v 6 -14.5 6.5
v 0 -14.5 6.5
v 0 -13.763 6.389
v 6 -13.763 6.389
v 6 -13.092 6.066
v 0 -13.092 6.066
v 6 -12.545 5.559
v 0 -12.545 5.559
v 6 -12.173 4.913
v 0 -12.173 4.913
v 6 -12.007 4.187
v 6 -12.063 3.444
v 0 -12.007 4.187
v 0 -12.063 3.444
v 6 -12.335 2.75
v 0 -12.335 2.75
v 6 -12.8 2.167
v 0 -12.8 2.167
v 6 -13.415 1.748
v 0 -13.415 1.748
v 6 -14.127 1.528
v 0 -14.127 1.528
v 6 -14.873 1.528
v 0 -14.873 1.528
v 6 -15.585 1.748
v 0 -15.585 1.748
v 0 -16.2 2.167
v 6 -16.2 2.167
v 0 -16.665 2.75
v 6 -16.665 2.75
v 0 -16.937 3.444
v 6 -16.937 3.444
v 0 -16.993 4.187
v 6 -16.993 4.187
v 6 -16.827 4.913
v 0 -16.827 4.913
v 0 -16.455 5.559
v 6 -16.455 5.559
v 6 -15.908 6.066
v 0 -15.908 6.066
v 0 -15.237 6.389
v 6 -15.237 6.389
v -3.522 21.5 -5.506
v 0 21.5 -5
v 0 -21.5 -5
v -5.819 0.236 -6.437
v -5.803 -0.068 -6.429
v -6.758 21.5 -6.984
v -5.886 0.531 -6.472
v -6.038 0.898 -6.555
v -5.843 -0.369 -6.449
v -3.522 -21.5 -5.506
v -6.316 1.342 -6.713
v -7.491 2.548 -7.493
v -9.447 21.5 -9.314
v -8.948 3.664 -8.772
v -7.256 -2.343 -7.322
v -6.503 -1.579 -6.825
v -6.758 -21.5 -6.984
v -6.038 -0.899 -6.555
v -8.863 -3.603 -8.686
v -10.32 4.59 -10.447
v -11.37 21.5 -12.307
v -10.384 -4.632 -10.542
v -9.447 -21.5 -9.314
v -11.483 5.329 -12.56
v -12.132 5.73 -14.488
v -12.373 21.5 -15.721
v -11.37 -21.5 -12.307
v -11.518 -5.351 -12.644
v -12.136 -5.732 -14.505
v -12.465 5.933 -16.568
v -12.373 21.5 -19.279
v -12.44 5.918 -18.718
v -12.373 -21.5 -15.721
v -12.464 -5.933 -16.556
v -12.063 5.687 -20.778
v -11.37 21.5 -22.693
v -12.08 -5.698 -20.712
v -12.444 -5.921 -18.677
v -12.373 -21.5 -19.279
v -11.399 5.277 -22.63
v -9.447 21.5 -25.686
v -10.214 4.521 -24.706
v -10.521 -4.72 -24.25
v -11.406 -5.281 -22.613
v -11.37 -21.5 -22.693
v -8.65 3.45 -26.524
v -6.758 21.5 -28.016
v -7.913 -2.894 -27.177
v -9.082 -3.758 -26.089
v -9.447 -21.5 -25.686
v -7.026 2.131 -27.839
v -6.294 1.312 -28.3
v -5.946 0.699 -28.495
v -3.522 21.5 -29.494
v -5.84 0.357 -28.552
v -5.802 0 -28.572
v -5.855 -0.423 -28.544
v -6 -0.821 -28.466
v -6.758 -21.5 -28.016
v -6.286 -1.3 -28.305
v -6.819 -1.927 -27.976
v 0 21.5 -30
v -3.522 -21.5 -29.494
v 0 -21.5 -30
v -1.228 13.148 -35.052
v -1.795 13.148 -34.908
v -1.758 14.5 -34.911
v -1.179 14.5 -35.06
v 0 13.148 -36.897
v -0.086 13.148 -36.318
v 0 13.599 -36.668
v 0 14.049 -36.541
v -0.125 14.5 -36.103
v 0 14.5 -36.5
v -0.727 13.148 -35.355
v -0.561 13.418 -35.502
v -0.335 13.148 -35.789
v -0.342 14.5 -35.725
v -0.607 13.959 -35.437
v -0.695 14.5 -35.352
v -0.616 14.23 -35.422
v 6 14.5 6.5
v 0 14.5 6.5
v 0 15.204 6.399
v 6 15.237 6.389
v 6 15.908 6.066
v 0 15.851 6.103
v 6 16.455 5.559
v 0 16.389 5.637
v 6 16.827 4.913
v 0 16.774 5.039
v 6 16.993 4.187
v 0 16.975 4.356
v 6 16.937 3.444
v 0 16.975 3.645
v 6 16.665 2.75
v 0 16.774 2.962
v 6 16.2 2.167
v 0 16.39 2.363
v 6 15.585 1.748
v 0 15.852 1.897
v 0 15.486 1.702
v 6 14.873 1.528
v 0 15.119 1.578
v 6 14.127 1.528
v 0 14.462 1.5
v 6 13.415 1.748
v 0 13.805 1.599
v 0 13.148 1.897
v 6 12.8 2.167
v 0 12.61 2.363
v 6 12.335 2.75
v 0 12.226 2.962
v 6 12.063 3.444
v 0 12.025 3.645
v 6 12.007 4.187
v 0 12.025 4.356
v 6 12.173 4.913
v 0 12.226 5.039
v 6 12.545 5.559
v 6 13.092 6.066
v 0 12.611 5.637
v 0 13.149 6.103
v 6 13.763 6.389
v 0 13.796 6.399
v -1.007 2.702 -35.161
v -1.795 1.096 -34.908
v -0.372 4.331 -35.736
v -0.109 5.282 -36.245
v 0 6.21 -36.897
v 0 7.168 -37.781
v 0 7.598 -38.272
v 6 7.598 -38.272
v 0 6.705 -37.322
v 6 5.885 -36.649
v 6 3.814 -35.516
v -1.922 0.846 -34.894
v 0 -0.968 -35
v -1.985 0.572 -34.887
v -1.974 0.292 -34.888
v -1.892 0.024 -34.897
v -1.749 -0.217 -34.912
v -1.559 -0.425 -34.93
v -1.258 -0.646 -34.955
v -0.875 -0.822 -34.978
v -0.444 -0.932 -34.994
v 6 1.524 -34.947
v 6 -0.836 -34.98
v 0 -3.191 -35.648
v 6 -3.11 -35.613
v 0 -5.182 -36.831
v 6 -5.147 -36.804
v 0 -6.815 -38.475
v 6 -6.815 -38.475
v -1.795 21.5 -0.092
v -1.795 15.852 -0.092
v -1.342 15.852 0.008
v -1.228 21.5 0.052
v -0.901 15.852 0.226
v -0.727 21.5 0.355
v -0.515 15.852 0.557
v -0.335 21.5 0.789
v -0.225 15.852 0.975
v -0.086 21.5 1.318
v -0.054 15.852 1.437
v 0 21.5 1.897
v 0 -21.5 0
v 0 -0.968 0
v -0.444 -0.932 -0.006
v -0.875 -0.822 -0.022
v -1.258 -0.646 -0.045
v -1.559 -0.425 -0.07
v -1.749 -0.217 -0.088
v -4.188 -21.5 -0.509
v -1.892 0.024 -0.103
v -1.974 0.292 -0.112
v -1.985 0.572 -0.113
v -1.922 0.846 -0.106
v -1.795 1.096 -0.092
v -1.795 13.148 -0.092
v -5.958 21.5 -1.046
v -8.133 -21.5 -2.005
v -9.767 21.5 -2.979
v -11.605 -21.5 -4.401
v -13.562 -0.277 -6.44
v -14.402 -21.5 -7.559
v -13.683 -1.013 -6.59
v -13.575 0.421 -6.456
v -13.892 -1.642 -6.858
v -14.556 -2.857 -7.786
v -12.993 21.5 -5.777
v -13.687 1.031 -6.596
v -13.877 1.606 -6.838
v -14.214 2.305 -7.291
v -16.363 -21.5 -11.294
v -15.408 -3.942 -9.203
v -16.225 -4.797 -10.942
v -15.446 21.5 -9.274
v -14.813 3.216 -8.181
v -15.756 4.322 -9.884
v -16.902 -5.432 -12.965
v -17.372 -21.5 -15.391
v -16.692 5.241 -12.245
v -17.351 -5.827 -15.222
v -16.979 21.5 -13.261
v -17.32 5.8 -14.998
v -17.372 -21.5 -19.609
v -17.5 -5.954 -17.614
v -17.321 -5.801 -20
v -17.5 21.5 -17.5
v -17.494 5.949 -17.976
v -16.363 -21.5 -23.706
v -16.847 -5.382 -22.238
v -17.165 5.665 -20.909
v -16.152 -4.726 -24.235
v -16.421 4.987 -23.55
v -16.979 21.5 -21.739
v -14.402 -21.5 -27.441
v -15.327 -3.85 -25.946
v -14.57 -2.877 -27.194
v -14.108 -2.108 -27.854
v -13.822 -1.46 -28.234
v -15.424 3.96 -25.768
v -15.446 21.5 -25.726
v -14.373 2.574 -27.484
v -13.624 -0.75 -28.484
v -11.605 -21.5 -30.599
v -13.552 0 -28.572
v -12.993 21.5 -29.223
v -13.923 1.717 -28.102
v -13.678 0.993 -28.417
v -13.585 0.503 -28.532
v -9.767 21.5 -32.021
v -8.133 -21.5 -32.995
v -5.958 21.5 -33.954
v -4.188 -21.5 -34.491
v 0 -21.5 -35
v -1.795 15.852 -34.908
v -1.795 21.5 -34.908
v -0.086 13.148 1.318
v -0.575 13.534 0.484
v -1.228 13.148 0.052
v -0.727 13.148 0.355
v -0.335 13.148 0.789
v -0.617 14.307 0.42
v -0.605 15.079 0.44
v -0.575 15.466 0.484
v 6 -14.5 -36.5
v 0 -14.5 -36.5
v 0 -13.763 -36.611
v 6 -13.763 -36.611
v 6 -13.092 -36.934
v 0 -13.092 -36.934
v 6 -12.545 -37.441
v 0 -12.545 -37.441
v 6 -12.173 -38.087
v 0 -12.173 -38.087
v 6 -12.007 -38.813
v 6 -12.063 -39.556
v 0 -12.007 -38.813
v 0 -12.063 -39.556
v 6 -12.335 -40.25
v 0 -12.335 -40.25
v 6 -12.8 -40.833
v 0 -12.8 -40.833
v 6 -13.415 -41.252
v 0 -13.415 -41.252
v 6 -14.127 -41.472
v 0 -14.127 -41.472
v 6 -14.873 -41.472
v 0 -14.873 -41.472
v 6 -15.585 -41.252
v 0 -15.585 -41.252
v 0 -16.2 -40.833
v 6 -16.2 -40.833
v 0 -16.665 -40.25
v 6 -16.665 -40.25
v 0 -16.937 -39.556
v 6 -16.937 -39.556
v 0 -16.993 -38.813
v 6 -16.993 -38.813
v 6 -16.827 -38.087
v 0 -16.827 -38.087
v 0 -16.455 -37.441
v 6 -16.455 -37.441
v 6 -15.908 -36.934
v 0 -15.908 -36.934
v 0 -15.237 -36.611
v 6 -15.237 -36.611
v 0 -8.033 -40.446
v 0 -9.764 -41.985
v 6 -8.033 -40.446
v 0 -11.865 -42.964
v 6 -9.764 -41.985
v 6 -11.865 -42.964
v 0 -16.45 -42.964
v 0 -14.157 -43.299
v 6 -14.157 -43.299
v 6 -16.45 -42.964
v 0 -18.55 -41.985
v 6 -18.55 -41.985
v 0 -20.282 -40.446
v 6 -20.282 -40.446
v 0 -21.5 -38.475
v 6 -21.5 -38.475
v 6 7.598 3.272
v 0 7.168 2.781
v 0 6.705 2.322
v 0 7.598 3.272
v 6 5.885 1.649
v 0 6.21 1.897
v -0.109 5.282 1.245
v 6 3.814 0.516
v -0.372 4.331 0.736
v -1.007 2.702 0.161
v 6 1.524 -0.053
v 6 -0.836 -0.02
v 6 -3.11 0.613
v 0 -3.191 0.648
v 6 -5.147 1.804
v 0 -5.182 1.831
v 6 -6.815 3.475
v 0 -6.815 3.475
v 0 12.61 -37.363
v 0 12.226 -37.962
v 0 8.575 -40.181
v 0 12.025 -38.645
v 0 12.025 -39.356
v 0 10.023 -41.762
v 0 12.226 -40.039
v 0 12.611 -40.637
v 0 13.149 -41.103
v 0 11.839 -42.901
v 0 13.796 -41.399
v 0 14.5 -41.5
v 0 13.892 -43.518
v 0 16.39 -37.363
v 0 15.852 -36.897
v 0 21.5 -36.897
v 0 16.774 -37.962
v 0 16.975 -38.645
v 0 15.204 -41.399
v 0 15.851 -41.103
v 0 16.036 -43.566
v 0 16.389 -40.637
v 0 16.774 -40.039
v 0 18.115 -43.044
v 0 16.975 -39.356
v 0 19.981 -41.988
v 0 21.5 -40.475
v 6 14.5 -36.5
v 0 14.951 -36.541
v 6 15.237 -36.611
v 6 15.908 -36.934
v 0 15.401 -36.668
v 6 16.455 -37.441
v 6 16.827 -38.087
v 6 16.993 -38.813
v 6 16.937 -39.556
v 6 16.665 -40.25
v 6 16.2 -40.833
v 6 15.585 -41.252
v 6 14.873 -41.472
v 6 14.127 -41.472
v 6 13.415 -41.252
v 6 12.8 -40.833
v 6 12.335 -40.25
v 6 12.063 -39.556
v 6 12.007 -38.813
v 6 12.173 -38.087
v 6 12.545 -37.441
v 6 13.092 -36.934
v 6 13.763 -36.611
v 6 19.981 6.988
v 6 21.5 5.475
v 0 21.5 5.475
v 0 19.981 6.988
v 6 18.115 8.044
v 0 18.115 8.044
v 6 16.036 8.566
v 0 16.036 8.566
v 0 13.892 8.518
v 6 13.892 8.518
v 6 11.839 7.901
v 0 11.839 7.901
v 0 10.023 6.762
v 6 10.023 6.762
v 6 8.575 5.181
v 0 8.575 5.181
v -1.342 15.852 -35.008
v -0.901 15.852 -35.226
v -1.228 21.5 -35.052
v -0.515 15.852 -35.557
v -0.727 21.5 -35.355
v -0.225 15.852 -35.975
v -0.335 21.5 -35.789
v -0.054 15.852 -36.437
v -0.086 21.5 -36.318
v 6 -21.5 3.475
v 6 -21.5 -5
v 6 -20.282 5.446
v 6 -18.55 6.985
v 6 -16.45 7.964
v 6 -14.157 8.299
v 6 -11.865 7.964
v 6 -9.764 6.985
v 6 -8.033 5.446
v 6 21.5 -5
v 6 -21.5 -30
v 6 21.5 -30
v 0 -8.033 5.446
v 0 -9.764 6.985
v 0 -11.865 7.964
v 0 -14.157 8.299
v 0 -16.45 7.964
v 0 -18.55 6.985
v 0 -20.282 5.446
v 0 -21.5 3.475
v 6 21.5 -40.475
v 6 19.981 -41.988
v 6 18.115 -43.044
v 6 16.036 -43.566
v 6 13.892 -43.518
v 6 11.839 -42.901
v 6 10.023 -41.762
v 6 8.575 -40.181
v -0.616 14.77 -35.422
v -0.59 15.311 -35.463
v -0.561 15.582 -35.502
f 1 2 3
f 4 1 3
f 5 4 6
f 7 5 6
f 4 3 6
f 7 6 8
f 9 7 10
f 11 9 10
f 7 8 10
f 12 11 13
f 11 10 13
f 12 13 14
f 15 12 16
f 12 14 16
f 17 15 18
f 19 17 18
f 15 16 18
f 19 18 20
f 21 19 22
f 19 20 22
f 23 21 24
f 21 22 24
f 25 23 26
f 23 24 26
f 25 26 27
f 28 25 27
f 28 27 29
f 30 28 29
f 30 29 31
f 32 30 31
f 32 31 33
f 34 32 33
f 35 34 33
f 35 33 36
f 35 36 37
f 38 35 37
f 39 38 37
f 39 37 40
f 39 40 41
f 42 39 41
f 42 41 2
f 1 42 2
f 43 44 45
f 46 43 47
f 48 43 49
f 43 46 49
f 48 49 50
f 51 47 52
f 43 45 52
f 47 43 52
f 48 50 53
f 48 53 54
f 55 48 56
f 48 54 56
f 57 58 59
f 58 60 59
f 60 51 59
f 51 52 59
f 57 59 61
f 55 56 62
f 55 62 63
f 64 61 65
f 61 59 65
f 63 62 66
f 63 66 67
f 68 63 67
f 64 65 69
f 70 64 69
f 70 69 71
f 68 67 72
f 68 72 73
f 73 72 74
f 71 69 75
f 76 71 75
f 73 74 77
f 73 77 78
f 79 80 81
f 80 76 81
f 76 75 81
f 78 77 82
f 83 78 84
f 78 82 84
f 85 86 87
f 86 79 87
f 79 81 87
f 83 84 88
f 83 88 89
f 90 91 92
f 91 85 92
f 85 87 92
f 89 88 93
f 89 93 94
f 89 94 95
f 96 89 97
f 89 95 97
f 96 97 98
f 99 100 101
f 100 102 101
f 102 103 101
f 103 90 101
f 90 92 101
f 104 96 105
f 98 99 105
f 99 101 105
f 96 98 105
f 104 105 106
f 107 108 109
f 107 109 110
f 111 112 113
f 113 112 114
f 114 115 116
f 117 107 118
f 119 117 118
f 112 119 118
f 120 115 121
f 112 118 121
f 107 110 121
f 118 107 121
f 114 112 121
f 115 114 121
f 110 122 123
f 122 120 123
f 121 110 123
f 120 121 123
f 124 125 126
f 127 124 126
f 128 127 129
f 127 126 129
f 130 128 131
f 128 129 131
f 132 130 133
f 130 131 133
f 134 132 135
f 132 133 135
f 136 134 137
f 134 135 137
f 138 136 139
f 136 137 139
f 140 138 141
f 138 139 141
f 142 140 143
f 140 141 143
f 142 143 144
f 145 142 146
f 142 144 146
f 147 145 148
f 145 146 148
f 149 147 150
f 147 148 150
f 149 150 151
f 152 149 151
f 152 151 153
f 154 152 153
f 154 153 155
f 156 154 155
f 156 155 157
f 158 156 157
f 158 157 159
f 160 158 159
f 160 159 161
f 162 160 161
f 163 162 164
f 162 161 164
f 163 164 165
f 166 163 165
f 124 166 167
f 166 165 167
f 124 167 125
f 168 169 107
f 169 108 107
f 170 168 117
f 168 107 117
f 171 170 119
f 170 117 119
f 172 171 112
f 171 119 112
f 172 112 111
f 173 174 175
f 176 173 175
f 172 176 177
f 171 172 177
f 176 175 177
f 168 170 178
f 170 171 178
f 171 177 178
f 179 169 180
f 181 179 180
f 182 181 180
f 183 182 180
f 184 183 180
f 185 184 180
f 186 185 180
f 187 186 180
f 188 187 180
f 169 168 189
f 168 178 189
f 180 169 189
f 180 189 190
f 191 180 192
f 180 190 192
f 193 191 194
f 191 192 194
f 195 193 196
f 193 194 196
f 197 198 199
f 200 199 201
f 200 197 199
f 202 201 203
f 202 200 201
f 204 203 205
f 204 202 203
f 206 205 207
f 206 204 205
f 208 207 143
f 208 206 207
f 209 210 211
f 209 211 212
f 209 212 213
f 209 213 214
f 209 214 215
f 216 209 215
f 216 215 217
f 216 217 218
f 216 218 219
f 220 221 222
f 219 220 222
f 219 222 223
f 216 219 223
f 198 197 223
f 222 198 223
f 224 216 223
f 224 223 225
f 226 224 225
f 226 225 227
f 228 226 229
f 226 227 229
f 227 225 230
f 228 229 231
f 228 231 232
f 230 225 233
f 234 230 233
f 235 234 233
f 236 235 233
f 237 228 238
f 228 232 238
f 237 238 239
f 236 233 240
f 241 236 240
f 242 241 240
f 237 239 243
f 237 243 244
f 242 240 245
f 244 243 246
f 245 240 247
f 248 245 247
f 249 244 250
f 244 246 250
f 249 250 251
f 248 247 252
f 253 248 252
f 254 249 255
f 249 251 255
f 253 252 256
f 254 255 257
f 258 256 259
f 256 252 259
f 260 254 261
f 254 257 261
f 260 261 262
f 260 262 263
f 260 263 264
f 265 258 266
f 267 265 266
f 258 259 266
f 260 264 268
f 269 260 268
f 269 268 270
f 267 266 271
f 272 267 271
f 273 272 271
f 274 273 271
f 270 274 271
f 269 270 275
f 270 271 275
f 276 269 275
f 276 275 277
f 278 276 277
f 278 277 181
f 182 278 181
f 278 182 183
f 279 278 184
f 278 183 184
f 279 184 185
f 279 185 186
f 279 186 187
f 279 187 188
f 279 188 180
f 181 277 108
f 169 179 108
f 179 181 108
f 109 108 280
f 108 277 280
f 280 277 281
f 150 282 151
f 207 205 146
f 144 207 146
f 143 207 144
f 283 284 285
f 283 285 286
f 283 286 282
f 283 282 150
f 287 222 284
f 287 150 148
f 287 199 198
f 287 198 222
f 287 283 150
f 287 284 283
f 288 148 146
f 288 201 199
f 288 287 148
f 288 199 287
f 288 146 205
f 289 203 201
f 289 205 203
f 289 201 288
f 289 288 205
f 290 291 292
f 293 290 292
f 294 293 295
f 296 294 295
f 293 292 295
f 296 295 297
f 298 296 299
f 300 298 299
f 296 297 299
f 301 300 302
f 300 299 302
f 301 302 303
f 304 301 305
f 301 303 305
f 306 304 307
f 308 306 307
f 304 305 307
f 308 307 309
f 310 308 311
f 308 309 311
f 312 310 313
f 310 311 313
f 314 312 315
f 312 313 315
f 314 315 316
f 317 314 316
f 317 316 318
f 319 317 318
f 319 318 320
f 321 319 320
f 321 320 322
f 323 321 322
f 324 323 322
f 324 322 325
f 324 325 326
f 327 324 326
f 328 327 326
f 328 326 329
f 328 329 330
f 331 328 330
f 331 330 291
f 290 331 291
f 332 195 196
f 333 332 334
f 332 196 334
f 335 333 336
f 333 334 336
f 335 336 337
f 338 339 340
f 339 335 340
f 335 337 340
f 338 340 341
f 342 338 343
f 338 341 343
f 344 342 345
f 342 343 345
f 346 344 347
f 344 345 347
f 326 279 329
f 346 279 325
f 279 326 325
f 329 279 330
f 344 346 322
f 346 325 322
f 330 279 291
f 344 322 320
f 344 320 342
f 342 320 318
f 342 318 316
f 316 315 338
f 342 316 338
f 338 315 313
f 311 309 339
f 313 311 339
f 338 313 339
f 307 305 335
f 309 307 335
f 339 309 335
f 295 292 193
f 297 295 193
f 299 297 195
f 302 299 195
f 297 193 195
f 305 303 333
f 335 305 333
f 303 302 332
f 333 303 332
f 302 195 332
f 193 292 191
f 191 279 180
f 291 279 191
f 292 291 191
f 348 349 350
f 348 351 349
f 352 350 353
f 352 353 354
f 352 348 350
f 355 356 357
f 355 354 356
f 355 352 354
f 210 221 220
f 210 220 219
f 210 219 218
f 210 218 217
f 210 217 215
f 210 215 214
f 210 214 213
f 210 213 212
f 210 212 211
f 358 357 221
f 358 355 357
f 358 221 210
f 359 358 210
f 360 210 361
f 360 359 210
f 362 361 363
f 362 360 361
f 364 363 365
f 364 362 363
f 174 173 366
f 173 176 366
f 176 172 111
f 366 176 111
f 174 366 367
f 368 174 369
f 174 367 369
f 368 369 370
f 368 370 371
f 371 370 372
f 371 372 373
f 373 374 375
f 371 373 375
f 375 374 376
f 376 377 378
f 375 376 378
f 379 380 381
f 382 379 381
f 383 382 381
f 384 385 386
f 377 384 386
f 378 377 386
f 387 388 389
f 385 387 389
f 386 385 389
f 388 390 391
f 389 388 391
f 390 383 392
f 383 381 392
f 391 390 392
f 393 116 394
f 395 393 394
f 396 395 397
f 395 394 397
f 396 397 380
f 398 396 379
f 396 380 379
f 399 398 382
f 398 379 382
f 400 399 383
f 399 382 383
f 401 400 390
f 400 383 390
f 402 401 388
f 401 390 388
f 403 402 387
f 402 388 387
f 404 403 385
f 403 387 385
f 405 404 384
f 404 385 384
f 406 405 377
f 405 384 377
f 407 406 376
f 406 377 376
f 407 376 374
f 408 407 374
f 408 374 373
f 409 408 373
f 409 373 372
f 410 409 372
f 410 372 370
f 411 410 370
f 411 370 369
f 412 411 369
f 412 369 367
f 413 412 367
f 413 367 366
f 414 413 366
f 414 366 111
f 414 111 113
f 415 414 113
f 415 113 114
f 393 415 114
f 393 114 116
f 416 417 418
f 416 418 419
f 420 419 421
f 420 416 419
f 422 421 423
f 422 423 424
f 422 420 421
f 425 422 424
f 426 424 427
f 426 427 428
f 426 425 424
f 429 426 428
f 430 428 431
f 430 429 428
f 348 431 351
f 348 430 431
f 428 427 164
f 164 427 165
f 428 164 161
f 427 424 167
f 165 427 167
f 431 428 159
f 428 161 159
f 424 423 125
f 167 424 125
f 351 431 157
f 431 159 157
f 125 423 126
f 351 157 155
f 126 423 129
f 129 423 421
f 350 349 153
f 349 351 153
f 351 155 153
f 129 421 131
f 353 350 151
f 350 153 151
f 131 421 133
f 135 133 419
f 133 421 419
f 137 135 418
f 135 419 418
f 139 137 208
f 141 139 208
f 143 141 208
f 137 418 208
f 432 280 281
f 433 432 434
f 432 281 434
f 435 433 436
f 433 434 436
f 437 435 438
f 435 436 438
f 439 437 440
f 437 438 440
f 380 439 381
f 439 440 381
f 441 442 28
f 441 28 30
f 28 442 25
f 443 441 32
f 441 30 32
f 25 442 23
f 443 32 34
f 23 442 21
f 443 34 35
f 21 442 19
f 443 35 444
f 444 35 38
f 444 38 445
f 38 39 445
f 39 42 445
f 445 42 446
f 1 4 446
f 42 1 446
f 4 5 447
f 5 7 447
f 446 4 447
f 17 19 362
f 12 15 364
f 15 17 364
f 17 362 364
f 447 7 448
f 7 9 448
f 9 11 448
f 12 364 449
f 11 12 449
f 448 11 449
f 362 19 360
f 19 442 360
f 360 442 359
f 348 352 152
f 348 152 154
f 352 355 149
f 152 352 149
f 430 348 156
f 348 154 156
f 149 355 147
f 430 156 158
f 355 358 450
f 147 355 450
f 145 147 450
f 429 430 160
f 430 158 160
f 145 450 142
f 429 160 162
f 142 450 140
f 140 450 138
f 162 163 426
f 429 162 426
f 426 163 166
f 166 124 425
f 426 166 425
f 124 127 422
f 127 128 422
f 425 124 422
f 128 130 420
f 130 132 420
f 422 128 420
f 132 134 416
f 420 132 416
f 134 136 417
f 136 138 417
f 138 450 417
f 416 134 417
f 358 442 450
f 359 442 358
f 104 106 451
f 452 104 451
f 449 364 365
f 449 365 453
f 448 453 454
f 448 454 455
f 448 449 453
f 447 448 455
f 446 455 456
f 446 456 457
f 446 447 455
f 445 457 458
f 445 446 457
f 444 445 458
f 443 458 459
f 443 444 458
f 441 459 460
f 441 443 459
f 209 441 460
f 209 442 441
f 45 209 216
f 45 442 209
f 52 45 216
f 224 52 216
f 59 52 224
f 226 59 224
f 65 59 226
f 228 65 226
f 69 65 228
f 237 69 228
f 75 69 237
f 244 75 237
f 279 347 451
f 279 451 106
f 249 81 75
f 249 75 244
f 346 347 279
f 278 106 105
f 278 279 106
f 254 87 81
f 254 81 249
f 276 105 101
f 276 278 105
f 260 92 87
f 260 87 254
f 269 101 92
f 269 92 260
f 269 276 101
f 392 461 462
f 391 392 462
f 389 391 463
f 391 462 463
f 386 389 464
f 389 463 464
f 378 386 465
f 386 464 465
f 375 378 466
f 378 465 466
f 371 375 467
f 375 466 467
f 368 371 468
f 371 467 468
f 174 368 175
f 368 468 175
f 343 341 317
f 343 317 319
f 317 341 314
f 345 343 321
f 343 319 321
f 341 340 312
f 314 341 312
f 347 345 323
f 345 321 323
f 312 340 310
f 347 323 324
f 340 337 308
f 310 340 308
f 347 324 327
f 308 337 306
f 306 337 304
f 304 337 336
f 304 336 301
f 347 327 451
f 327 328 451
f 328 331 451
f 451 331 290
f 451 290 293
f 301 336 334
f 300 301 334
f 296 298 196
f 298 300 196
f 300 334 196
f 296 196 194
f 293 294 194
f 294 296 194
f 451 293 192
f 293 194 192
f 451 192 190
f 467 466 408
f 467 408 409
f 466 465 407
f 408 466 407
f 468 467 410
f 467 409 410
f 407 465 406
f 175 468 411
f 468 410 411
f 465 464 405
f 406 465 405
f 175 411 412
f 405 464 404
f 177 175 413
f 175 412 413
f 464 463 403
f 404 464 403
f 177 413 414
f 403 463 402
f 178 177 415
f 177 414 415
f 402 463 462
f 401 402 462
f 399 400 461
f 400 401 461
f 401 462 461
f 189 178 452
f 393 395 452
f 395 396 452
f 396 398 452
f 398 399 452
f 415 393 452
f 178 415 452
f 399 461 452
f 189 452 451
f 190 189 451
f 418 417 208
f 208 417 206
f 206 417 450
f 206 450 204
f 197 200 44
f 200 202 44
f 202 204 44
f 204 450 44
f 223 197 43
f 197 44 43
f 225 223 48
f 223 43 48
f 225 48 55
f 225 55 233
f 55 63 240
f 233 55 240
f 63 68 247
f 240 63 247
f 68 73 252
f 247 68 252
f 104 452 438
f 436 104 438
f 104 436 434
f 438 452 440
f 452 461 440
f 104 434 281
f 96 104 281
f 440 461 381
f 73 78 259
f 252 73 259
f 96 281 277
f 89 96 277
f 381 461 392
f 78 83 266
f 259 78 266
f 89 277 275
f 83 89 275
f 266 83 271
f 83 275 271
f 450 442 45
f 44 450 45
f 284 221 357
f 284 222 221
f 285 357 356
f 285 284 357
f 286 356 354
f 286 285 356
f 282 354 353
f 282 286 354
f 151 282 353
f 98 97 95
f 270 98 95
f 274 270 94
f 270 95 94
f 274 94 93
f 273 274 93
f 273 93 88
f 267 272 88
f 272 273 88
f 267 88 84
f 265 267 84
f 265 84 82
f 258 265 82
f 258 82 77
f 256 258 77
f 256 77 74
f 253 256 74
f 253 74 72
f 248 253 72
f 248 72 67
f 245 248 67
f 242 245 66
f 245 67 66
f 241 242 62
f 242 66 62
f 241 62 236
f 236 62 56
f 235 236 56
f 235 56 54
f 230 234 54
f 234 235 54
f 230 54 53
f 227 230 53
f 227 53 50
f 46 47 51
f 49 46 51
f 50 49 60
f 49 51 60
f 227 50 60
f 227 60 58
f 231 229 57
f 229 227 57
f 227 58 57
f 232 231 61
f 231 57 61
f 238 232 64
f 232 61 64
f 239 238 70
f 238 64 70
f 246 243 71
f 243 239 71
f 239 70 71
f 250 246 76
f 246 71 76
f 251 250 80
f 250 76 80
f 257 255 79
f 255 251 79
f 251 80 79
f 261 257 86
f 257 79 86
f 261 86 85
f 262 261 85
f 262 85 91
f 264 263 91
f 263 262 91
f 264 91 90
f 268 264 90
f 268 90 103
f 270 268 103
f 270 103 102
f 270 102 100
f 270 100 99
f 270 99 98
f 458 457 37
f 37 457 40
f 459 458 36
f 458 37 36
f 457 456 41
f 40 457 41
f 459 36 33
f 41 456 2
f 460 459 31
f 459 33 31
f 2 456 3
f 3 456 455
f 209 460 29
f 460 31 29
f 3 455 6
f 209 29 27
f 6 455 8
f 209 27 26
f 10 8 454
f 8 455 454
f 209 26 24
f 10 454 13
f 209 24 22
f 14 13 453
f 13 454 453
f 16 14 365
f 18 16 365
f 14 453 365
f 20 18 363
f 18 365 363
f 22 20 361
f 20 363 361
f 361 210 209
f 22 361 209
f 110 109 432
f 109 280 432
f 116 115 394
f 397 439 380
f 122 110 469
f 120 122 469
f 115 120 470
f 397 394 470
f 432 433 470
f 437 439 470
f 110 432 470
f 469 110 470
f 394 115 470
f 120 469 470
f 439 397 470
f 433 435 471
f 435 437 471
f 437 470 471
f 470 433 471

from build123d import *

# Parameters (mm, degrees)
BOSS_EXTRUDE2_DEPTH      = 21.5
CUT_EXTRUDE8_DEPTH       = 44
CUT_EXTRUDE9_DEPTH       = 24.5
SKETCH18_R               = 2.5
CUT_EXTRUDE13_DEPTH      = 18.5000001
CUT_EXTRUDE13_DEPTH_BACK = 7.0000001
SKETCH19_RX              = 11.071840333
SKETCH19_RY              = 5.954349413
CUT_EXTRUDE14_DEPTH      = 7.0000001
CUT_EXTRUDE14_DEPTH_BACK = 18.5000001
FILLET6_R                = 2
FILLET7_R                = 2


with BuildPart() as part:
    # Sketch12 → Boss-Extrude2 (new body, symmetric)
    with BuildSketch(Plane(origin=(0, 0, 0), x_dir=(1, 0, 0), z_dir=(0, 1, 0))):
        with BuildLine():
            Line((0, 35), (0, 52))
            Line((0, 52), (6, 52))
            Line((6, 52), (6, -17))
            Line((6, -17), (0, -17))
            Line((0, -17), (0, 0))
            ThreePointArc((0, 0), (-17.5, 17.5), (0, 35))
        make_face()
    extrude(amount=BOSS_EXTRUDE2_DEPTH, both=True)

    # Sketch13 → Cut-Extrude8 (cut, through all)
    with BuildSketch(Plane.XZ.offset(21.5)):
        with BuildLine():
            Line((0, -30), (6, -30))
            Line((6, -30), (6, -5))
            Line((6, -5), (0, -5))
            ThreePointArc((0, -5), (-12.5, -17.5), (0, -30))
        make_face()
    extrude(amount=-CUT_EXTRUDE8_DEPTH, mode=Mode.SUBTRACT)

    # Sketch14 → Cut-Extrude9 (cut, through all)
    with BuildSketch(Plane(origin=(6, 0, 0), x_dir=(0, 0, -1), z_dir=(1, 0, 0))):
        with BuildLine():
            Line((-3.475, -21.5), (-17, -21.5))
            Line((-17, -21.5), (-17, 21.5))
            Line((-17, 21.5), (-5.475, 21.5))
            ThreePointArc((-5.475, 21.5), (-8.517618353, 13.892451617), (-3.272109233, 7.598251675))
            ThreePointArc((-3.272109233, 7.598251675), (0.112562803, 0.342782413), (-3.475, -6.814537766))
            ThreePointArc((-3.475, -6.814537766), (-8.299421353, -14.157268883), (-3.475, -21.5))
        make_face()
    cut_extrude9 = extrude(amount=-CUT_EXTRUDE9_DEPTH, mode=Mode.SUBTRACT)

    # Mirror1: Cut-Extrude9 across plane
    add(cut_extrude9.mirror(Plane.XY.offset(-17.5)), mode=Mode.SUBTRACT)

    # Sketch18 → Cut-Extrude13 (cut, two sides)
    with BuildSketch(Plane.ZY) as cut_extrude13_sk:
        with Locations((-39, 14.5)):
            Circle(SKETCH18_R)
        with Locations((4, 14.5)):
            Circle(SKETCH18_R)
        with Locations((-39, -14.5)):
            Circle(SKETCH18_R)
        with Locations((4, -14.5)):
            Circle(SKETCH18_R)
    extrude(amount=CUT_EXTRUDE13_DEPTH, mode=Mode.SUBTRACT)
    extrude(cut_extrude13_sk.sketch, amount=-CUT_EXTRUDE13_DEPTH_BACK, mode=Mode.SUBTRACT)

    # Sketch19 → Cut-Extrude14 (cut, two sides)
    with BuildSketch(Plane(origin=(0, 0, 0), x_dir=(0, 0, -1), z_dir=(1, 0, 0))) as cut_extrude14_sk:
        with Locations(Location((17.5, 0), (0, 0, 0))):
            Ellipse(SKETCH19_RX, SKETCH19_RY)
    extrude(amount=CUT_EXTRUDE14_DEPTH, mode=Mode.SUBTRACT)
    extrude(cut_extrude14_sk.sketch, amount=-CUT_EXTRUDE14_DEPTH_BACK, mode=Mode.SUBTRACT)

    # Fillet6
    fillet6_edges = [part.edges().sort_by_distance(p)[0] for p in [
        (0, 11.706035382, 0),
    ]]
    fillet(fillet6_edges, radius=FILLET6_R)

    # Fillet7
    fillet7_edges = [part.edges().sort_by_distance(p)[0] for p in [
        (0, 11.706035382, -35),
    ]]
    fillet(fillet7_edges, radius=FILLET7_R)


solid = part.part
